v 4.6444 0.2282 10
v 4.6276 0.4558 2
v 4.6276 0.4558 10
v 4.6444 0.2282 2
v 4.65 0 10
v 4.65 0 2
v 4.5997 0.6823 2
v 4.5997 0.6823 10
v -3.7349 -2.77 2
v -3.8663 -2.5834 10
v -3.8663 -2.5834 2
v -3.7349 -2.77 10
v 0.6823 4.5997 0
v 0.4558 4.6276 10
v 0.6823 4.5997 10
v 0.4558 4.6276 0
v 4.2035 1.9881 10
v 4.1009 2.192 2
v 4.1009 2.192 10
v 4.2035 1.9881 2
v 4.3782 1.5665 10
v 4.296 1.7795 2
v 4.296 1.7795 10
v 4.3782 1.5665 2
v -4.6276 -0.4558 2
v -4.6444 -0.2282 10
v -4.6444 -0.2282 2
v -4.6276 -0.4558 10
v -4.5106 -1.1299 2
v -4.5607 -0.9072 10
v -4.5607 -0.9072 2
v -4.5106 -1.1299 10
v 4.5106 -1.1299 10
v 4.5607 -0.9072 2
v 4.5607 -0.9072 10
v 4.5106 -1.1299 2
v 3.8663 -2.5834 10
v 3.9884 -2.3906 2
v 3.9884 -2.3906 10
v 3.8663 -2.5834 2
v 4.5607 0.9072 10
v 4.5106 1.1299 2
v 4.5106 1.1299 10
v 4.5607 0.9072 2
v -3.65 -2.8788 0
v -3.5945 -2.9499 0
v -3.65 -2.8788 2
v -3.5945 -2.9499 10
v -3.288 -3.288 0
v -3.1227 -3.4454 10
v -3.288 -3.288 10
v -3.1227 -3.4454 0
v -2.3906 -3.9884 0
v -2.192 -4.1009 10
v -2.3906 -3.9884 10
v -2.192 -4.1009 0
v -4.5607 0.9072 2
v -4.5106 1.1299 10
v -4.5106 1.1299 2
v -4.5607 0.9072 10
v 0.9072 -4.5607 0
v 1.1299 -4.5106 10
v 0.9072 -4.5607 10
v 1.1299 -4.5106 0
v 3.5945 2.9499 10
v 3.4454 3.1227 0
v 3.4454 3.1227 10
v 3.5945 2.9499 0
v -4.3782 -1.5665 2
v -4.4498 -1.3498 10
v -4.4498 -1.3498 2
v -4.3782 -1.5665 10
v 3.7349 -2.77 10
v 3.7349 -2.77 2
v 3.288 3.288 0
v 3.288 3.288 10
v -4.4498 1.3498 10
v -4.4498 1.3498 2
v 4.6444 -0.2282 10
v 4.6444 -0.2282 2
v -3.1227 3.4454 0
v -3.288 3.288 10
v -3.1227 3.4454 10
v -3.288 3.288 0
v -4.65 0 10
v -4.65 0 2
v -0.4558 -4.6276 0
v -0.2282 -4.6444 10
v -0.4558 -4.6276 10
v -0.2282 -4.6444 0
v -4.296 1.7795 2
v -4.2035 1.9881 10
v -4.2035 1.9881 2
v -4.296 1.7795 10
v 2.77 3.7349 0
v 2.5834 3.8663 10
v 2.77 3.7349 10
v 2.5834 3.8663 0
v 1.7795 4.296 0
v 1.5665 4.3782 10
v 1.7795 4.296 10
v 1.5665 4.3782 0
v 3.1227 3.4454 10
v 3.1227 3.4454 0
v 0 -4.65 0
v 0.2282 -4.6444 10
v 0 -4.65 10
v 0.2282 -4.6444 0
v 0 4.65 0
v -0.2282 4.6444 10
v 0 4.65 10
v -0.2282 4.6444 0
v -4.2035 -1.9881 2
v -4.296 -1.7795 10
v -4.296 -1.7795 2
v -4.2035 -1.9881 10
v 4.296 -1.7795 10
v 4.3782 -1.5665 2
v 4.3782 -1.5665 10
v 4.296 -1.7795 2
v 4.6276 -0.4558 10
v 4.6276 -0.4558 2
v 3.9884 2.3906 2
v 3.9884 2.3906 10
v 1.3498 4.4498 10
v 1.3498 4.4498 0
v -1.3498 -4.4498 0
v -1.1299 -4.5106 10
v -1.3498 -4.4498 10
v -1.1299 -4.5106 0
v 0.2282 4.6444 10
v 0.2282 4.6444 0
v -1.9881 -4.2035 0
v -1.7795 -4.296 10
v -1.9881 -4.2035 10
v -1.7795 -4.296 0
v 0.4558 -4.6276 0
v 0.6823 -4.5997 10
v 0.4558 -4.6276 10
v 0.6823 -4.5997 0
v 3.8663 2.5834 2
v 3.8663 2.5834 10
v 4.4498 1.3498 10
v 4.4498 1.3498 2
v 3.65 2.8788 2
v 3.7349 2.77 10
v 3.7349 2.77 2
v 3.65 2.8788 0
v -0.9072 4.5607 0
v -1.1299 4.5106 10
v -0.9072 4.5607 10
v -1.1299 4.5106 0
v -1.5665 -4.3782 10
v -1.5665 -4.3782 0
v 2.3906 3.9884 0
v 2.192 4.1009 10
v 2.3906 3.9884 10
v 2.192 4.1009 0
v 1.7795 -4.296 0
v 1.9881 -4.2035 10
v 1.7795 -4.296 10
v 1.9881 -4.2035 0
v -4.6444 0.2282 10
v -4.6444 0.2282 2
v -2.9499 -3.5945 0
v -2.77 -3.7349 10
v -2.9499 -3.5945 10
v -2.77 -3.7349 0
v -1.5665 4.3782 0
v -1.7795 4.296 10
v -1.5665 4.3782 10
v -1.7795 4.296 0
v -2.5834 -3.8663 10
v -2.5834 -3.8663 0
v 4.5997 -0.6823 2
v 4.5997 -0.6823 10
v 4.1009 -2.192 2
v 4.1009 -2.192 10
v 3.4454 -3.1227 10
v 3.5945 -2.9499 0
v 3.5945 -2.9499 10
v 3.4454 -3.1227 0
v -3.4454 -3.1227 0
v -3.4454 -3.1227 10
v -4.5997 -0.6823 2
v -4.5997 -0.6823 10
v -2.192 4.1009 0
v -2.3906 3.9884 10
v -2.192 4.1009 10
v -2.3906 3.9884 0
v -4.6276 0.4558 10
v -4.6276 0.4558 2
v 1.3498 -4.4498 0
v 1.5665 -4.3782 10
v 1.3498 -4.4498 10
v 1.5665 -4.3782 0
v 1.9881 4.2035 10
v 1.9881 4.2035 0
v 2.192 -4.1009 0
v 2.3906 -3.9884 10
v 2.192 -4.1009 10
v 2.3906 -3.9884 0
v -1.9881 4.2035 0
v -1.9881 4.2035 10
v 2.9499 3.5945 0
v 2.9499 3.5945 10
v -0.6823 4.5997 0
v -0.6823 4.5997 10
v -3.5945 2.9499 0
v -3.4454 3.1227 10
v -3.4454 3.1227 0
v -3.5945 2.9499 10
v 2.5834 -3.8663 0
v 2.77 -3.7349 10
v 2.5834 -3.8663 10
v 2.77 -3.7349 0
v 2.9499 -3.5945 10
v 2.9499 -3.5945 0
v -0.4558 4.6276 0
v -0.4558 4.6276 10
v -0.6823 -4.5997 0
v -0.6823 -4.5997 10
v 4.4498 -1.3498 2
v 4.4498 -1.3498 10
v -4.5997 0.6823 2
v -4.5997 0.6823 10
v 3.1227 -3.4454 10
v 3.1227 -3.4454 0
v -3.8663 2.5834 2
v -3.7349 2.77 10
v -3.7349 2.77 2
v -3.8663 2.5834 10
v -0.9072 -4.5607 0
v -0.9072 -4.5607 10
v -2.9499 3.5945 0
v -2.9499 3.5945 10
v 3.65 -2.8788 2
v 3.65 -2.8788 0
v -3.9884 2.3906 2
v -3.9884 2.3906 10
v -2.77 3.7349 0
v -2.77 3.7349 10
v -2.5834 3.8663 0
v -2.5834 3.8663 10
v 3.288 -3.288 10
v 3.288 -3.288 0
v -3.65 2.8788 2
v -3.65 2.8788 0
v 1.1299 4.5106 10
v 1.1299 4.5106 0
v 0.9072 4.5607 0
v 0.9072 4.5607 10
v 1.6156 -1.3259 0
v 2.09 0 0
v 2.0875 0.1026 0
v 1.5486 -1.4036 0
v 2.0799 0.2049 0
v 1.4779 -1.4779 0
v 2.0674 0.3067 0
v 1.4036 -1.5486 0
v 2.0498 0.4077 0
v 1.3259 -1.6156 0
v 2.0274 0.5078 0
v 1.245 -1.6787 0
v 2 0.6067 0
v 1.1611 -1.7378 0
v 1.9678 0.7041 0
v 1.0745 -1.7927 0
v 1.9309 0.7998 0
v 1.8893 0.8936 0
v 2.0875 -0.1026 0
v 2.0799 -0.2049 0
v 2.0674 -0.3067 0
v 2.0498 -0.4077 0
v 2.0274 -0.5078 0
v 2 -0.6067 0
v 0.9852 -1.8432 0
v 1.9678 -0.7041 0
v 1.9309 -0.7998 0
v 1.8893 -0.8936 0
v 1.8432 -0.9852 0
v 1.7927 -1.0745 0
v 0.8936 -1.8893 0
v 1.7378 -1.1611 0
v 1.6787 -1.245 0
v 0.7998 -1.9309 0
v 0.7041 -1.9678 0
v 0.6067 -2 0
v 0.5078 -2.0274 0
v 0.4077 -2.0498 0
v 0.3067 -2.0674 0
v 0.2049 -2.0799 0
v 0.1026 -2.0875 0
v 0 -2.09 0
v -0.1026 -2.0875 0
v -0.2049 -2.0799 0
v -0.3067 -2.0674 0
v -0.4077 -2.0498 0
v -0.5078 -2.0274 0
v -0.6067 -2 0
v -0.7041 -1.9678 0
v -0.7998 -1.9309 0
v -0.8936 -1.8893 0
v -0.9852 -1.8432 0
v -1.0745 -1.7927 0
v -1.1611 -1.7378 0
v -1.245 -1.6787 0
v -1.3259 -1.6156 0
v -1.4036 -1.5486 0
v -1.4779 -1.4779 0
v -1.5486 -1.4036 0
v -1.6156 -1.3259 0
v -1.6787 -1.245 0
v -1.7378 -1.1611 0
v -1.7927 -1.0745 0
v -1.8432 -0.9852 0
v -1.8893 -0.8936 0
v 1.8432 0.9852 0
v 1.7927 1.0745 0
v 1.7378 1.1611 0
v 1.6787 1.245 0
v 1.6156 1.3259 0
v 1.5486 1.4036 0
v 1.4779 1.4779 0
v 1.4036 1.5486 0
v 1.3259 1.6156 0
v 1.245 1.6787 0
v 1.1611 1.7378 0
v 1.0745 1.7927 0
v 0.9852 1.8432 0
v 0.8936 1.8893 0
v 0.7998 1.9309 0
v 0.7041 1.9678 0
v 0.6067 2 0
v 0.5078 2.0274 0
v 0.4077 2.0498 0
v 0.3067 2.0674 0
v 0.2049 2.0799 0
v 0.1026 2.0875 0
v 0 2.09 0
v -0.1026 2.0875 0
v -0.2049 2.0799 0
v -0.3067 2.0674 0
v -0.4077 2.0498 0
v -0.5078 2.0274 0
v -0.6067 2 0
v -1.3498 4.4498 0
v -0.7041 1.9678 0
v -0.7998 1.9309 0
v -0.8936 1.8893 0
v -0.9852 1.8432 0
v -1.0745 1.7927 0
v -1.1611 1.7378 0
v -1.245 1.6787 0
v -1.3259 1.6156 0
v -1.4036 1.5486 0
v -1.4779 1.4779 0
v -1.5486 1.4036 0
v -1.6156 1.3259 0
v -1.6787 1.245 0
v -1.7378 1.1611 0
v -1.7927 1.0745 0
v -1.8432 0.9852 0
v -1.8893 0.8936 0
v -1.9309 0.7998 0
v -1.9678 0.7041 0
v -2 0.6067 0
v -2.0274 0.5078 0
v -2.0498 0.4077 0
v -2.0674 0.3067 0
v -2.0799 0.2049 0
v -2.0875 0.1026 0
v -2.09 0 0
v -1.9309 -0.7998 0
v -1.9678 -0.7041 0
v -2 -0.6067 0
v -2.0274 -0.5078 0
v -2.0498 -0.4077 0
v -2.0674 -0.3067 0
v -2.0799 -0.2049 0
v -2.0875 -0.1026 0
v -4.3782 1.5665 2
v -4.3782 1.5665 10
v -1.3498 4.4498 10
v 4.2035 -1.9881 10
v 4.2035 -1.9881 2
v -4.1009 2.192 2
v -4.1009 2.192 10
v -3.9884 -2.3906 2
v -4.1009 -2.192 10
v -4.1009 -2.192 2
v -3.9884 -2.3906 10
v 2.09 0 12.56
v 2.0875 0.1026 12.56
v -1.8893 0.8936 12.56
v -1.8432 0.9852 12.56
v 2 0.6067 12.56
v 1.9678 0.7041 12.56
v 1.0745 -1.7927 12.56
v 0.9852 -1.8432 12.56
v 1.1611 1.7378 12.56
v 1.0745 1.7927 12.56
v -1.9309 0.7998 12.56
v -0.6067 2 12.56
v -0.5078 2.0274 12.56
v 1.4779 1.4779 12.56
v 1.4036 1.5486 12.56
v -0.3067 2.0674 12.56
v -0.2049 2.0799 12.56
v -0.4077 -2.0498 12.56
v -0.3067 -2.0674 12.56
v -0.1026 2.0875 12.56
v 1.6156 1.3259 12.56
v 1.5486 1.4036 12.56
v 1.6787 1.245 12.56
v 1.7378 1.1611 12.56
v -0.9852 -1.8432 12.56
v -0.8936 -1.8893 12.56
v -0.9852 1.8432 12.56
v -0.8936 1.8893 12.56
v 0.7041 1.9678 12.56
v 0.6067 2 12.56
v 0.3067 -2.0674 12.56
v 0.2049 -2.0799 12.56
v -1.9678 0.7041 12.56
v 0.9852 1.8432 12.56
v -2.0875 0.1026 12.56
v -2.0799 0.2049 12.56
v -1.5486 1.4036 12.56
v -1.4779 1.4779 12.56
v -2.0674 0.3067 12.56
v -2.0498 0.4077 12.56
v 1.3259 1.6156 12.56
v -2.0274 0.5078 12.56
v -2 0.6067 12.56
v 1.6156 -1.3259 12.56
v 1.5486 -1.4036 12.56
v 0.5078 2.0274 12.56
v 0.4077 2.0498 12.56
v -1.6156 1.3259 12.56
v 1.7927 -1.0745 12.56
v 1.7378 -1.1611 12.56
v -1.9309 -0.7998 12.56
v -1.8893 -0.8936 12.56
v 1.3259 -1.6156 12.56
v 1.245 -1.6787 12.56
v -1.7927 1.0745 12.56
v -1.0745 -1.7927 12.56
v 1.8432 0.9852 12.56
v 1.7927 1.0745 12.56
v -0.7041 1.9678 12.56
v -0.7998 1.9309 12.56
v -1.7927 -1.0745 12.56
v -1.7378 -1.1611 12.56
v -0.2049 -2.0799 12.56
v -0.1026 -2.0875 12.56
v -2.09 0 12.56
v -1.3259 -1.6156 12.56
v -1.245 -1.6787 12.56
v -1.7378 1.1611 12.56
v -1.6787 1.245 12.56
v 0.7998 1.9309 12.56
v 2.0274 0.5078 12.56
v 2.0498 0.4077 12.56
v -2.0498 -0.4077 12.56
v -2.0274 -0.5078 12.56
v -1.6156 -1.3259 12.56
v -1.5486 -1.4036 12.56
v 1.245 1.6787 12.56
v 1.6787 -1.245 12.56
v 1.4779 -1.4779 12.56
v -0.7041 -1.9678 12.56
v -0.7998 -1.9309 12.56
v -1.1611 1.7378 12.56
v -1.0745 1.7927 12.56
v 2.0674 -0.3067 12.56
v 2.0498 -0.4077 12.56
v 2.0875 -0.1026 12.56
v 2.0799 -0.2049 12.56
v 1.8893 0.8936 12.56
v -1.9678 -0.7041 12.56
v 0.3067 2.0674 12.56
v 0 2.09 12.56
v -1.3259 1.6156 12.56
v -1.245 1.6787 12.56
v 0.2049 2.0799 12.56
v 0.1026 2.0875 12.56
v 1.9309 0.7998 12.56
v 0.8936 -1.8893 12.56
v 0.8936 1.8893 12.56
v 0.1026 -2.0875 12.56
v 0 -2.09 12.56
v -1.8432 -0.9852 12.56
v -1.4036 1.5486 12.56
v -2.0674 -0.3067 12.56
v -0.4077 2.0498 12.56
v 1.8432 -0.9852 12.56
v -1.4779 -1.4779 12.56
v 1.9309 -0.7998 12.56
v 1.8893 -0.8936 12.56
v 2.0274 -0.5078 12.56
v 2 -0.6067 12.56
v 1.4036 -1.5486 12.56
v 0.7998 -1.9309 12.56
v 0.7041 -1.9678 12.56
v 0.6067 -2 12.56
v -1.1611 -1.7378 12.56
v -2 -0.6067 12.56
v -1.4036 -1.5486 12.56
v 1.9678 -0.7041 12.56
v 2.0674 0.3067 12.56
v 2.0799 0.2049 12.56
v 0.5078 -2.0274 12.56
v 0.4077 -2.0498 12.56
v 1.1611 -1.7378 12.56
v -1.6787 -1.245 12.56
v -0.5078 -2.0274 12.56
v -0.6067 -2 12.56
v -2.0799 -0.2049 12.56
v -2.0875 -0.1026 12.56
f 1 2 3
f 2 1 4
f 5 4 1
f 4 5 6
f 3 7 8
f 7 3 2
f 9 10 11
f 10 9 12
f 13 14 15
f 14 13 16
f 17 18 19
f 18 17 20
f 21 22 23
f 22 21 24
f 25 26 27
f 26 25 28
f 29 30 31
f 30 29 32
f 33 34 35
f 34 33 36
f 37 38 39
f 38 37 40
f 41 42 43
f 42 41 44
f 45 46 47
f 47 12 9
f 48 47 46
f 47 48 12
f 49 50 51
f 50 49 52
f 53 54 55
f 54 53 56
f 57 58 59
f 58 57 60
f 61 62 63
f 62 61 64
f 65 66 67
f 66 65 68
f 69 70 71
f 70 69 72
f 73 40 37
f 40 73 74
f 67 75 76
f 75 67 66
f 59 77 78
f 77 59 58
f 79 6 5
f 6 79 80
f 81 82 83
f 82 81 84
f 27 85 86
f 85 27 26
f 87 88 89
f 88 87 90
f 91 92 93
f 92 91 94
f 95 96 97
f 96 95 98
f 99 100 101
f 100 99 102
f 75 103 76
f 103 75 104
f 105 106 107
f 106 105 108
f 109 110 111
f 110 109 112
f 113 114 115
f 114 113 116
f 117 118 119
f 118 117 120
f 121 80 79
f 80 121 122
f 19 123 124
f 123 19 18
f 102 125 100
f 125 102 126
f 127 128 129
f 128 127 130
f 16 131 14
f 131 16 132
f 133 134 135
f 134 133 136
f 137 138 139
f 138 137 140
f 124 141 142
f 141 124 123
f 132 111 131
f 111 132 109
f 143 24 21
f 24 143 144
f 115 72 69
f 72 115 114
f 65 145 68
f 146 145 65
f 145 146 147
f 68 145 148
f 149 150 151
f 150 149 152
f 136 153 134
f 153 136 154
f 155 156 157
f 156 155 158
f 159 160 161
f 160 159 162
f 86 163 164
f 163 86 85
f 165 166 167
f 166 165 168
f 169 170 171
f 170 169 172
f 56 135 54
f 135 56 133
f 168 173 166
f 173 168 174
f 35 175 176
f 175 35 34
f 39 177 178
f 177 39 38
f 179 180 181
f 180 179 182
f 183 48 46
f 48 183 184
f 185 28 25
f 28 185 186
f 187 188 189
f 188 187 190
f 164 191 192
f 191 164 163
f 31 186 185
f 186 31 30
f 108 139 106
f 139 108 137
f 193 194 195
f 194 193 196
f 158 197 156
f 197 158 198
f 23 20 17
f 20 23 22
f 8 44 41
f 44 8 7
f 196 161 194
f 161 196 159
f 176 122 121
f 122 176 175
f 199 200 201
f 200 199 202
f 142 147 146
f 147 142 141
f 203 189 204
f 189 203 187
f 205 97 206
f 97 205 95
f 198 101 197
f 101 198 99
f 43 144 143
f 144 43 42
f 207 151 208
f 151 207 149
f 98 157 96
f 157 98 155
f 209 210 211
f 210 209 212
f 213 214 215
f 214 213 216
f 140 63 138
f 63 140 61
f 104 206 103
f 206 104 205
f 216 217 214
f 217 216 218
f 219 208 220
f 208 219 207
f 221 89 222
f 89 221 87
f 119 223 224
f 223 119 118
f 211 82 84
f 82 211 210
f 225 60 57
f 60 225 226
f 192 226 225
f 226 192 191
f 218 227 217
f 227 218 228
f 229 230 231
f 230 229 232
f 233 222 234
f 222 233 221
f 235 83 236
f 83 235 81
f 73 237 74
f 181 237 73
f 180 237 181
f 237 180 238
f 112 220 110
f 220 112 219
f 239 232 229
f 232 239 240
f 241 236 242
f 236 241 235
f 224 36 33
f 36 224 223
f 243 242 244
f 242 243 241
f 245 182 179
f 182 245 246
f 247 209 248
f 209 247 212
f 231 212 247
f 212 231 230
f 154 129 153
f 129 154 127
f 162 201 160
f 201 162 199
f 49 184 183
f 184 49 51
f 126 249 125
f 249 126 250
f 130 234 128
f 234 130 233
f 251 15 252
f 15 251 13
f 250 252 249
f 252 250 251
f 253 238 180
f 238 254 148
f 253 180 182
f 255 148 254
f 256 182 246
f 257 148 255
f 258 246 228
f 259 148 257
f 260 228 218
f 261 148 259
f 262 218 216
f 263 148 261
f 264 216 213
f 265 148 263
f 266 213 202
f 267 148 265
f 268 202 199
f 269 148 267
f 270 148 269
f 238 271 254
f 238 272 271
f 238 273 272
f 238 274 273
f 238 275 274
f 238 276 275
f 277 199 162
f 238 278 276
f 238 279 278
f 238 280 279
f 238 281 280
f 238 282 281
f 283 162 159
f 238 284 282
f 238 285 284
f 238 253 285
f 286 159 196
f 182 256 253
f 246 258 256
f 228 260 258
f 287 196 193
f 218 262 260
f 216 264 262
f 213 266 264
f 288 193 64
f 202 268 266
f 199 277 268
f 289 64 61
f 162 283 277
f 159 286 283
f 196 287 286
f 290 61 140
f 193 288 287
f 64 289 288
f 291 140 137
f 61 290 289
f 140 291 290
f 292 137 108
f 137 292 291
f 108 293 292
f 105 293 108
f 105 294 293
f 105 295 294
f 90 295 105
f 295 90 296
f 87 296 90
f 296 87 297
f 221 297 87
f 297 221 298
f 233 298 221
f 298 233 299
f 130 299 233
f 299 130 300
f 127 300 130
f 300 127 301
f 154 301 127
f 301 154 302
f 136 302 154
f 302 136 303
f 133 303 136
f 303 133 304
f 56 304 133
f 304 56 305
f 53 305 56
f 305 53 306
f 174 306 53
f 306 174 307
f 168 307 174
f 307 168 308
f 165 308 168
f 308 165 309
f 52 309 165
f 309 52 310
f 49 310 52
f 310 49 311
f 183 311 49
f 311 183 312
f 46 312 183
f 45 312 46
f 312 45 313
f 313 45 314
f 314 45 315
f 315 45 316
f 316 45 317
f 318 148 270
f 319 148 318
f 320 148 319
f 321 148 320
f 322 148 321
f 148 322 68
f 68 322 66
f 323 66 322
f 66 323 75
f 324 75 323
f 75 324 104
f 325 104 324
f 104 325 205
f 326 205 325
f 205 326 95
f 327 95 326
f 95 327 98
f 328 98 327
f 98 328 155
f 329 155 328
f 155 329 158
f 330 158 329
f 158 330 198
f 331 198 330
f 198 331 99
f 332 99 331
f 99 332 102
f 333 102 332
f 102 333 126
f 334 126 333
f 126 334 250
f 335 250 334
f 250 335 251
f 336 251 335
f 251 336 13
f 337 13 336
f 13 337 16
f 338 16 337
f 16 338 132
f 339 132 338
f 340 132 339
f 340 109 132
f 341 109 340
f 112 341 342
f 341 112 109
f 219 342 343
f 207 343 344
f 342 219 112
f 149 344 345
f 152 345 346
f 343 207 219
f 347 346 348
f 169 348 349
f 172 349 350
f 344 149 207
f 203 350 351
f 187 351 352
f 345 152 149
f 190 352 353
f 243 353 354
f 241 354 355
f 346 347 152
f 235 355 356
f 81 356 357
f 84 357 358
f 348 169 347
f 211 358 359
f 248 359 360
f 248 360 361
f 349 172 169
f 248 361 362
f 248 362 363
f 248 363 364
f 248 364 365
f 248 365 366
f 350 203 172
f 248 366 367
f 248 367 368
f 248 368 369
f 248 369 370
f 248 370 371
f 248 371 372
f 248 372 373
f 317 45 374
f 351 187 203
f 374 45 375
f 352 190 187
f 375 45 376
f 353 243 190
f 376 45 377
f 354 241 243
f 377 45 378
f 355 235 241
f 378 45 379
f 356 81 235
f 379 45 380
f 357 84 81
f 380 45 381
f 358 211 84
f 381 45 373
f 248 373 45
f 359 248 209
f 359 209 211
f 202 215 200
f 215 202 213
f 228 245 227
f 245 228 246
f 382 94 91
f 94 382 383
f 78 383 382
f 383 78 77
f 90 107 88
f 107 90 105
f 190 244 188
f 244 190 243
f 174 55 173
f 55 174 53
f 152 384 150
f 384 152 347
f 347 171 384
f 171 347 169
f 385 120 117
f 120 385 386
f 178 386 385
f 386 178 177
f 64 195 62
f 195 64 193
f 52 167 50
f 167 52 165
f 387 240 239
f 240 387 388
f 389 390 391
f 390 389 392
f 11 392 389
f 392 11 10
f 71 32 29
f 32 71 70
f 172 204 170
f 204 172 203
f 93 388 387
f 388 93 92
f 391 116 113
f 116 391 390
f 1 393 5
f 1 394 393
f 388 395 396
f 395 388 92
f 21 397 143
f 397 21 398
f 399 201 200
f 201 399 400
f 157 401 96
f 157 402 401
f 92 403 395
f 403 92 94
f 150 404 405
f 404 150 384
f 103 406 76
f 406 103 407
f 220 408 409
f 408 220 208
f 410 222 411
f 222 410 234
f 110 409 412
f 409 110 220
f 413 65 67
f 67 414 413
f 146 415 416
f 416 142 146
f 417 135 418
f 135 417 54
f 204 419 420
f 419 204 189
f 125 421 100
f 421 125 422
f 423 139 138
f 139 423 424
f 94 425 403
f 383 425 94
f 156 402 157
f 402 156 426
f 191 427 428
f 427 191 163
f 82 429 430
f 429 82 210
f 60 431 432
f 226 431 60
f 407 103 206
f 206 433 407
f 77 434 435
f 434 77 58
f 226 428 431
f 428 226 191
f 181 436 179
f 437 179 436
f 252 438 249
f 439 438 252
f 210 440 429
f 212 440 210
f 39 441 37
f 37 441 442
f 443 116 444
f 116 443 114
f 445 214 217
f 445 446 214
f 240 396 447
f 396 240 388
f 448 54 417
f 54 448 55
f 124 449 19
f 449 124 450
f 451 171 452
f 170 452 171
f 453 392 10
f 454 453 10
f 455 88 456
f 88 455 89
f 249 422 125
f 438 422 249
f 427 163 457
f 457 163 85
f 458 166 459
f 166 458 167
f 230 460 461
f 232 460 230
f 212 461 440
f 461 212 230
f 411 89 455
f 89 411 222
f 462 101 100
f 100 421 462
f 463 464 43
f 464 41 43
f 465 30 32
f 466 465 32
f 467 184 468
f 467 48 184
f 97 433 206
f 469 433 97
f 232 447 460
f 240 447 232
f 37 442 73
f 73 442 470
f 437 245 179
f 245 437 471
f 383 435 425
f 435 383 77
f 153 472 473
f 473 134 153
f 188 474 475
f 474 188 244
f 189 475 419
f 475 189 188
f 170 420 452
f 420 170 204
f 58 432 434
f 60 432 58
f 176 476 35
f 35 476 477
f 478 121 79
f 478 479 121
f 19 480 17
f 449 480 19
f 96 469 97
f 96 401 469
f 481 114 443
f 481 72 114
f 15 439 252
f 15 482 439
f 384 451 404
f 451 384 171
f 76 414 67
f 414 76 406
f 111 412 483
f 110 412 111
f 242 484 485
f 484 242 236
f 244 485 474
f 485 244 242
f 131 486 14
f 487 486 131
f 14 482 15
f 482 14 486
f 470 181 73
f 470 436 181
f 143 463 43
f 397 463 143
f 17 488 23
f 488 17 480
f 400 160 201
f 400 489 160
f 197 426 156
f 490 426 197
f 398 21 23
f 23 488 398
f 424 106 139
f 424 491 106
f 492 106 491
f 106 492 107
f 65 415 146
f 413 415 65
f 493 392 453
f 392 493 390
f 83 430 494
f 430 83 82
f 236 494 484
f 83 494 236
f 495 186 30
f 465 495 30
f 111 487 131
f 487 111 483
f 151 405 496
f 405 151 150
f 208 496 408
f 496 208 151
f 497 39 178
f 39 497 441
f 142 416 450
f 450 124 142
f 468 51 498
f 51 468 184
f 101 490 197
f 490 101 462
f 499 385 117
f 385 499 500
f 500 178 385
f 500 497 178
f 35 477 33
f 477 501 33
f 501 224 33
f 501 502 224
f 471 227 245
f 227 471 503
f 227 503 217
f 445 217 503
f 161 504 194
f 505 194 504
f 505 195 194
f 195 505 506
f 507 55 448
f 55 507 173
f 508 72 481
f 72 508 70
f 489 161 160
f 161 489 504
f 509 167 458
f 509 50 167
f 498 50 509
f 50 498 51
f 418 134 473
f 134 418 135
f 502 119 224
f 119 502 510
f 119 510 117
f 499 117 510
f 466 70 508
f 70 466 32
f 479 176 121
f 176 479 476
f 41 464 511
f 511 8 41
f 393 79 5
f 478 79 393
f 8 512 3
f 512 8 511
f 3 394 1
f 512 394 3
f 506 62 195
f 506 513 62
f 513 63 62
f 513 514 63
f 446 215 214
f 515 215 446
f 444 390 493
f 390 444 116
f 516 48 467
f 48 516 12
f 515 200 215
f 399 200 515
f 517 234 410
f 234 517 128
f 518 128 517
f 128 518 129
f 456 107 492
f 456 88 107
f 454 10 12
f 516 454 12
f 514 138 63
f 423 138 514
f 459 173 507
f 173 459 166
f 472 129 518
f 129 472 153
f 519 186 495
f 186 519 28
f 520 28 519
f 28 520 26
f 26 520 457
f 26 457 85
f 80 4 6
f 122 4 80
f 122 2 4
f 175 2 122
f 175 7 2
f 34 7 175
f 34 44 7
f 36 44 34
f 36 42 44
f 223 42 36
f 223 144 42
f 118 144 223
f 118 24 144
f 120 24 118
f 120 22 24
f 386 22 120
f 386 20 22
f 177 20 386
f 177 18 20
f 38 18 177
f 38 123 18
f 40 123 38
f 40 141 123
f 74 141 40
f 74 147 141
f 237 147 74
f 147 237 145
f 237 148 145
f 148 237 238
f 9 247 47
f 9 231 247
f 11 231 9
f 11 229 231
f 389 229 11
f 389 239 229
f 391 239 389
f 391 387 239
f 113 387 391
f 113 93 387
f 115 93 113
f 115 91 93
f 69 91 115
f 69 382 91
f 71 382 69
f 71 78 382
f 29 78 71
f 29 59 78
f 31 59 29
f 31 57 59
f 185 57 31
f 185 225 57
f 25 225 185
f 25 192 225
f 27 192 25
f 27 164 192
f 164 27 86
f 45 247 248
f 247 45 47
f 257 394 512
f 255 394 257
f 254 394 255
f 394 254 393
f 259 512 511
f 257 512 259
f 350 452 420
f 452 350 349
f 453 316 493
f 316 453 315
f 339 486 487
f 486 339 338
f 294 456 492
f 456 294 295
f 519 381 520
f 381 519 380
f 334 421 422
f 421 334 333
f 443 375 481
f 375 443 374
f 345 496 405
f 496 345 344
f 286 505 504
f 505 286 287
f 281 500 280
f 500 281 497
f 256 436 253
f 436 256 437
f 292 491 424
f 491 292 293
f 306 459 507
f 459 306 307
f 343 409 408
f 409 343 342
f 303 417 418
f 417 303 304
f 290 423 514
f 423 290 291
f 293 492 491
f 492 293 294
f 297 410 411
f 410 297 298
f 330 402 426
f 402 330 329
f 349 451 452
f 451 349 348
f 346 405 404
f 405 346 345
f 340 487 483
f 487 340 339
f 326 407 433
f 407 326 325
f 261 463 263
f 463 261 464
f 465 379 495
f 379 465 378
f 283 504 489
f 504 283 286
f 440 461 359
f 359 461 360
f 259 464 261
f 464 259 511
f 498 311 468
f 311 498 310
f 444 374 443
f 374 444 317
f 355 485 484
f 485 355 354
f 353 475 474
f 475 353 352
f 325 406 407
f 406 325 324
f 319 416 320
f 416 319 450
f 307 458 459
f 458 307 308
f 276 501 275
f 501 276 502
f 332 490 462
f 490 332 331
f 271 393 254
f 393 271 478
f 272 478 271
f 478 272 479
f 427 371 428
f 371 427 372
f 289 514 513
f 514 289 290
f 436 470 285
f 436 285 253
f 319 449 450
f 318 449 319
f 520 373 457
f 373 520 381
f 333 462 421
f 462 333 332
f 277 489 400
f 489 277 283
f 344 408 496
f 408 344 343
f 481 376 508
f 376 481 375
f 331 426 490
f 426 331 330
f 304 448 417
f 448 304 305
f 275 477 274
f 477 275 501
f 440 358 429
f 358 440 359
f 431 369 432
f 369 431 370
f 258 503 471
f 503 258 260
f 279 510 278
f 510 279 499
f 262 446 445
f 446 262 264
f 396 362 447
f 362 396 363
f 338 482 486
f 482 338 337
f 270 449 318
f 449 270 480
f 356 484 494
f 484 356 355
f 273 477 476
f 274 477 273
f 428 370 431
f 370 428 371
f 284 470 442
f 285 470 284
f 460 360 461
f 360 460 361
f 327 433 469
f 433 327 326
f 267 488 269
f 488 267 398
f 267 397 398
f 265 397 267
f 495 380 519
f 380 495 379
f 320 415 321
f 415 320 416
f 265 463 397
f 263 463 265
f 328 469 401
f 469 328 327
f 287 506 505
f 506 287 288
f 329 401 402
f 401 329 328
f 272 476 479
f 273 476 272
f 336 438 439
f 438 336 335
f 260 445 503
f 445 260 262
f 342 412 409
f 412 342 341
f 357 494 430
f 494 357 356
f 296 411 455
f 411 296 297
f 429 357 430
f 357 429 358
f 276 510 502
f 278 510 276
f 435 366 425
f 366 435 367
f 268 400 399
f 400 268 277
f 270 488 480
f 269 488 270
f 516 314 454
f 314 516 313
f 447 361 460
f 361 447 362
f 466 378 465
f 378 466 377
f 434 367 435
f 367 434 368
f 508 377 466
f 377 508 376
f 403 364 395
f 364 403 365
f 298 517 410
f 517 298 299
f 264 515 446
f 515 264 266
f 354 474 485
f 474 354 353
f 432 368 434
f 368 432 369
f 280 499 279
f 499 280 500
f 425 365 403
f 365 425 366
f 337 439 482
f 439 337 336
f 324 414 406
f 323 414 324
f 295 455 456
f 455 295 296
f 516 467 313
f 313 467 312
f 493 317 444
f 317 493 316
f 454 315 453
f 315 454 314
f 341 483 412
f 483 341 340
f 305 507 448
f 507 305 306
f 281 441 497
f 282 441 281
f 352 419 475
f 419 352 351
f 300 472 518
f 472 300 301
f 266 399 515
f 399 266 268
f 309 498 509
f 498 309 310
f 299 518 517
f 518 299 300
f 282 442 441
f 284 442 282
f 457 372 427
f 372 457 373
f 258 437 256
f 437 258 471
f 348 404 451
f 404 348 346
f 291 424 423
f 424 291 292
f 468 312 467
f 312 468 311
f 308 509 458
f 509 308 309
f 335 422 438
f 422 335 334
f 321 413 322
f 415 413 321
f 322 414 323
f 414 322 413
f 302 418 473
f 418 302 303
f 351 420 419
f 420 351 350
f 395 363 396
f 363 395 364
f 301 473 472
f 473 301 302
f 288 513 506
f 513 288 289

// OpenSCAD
$fn=128;

difference()
{
    union()
    {
        cylinder(d=9.3,h=10);
        
        translate([0,0,10])
        cylinder(d1=9.3,d2=0,h=9.3/2);
    }
    
    translate([0,0,-1])
    cylinder(d=4.18,h=16);
    
    //Flats
    for (i=[0,1])
    mirror([i,0,0])
    translate([9.3/2-1,-10,-1])
    cube([20,20,3]);
}
